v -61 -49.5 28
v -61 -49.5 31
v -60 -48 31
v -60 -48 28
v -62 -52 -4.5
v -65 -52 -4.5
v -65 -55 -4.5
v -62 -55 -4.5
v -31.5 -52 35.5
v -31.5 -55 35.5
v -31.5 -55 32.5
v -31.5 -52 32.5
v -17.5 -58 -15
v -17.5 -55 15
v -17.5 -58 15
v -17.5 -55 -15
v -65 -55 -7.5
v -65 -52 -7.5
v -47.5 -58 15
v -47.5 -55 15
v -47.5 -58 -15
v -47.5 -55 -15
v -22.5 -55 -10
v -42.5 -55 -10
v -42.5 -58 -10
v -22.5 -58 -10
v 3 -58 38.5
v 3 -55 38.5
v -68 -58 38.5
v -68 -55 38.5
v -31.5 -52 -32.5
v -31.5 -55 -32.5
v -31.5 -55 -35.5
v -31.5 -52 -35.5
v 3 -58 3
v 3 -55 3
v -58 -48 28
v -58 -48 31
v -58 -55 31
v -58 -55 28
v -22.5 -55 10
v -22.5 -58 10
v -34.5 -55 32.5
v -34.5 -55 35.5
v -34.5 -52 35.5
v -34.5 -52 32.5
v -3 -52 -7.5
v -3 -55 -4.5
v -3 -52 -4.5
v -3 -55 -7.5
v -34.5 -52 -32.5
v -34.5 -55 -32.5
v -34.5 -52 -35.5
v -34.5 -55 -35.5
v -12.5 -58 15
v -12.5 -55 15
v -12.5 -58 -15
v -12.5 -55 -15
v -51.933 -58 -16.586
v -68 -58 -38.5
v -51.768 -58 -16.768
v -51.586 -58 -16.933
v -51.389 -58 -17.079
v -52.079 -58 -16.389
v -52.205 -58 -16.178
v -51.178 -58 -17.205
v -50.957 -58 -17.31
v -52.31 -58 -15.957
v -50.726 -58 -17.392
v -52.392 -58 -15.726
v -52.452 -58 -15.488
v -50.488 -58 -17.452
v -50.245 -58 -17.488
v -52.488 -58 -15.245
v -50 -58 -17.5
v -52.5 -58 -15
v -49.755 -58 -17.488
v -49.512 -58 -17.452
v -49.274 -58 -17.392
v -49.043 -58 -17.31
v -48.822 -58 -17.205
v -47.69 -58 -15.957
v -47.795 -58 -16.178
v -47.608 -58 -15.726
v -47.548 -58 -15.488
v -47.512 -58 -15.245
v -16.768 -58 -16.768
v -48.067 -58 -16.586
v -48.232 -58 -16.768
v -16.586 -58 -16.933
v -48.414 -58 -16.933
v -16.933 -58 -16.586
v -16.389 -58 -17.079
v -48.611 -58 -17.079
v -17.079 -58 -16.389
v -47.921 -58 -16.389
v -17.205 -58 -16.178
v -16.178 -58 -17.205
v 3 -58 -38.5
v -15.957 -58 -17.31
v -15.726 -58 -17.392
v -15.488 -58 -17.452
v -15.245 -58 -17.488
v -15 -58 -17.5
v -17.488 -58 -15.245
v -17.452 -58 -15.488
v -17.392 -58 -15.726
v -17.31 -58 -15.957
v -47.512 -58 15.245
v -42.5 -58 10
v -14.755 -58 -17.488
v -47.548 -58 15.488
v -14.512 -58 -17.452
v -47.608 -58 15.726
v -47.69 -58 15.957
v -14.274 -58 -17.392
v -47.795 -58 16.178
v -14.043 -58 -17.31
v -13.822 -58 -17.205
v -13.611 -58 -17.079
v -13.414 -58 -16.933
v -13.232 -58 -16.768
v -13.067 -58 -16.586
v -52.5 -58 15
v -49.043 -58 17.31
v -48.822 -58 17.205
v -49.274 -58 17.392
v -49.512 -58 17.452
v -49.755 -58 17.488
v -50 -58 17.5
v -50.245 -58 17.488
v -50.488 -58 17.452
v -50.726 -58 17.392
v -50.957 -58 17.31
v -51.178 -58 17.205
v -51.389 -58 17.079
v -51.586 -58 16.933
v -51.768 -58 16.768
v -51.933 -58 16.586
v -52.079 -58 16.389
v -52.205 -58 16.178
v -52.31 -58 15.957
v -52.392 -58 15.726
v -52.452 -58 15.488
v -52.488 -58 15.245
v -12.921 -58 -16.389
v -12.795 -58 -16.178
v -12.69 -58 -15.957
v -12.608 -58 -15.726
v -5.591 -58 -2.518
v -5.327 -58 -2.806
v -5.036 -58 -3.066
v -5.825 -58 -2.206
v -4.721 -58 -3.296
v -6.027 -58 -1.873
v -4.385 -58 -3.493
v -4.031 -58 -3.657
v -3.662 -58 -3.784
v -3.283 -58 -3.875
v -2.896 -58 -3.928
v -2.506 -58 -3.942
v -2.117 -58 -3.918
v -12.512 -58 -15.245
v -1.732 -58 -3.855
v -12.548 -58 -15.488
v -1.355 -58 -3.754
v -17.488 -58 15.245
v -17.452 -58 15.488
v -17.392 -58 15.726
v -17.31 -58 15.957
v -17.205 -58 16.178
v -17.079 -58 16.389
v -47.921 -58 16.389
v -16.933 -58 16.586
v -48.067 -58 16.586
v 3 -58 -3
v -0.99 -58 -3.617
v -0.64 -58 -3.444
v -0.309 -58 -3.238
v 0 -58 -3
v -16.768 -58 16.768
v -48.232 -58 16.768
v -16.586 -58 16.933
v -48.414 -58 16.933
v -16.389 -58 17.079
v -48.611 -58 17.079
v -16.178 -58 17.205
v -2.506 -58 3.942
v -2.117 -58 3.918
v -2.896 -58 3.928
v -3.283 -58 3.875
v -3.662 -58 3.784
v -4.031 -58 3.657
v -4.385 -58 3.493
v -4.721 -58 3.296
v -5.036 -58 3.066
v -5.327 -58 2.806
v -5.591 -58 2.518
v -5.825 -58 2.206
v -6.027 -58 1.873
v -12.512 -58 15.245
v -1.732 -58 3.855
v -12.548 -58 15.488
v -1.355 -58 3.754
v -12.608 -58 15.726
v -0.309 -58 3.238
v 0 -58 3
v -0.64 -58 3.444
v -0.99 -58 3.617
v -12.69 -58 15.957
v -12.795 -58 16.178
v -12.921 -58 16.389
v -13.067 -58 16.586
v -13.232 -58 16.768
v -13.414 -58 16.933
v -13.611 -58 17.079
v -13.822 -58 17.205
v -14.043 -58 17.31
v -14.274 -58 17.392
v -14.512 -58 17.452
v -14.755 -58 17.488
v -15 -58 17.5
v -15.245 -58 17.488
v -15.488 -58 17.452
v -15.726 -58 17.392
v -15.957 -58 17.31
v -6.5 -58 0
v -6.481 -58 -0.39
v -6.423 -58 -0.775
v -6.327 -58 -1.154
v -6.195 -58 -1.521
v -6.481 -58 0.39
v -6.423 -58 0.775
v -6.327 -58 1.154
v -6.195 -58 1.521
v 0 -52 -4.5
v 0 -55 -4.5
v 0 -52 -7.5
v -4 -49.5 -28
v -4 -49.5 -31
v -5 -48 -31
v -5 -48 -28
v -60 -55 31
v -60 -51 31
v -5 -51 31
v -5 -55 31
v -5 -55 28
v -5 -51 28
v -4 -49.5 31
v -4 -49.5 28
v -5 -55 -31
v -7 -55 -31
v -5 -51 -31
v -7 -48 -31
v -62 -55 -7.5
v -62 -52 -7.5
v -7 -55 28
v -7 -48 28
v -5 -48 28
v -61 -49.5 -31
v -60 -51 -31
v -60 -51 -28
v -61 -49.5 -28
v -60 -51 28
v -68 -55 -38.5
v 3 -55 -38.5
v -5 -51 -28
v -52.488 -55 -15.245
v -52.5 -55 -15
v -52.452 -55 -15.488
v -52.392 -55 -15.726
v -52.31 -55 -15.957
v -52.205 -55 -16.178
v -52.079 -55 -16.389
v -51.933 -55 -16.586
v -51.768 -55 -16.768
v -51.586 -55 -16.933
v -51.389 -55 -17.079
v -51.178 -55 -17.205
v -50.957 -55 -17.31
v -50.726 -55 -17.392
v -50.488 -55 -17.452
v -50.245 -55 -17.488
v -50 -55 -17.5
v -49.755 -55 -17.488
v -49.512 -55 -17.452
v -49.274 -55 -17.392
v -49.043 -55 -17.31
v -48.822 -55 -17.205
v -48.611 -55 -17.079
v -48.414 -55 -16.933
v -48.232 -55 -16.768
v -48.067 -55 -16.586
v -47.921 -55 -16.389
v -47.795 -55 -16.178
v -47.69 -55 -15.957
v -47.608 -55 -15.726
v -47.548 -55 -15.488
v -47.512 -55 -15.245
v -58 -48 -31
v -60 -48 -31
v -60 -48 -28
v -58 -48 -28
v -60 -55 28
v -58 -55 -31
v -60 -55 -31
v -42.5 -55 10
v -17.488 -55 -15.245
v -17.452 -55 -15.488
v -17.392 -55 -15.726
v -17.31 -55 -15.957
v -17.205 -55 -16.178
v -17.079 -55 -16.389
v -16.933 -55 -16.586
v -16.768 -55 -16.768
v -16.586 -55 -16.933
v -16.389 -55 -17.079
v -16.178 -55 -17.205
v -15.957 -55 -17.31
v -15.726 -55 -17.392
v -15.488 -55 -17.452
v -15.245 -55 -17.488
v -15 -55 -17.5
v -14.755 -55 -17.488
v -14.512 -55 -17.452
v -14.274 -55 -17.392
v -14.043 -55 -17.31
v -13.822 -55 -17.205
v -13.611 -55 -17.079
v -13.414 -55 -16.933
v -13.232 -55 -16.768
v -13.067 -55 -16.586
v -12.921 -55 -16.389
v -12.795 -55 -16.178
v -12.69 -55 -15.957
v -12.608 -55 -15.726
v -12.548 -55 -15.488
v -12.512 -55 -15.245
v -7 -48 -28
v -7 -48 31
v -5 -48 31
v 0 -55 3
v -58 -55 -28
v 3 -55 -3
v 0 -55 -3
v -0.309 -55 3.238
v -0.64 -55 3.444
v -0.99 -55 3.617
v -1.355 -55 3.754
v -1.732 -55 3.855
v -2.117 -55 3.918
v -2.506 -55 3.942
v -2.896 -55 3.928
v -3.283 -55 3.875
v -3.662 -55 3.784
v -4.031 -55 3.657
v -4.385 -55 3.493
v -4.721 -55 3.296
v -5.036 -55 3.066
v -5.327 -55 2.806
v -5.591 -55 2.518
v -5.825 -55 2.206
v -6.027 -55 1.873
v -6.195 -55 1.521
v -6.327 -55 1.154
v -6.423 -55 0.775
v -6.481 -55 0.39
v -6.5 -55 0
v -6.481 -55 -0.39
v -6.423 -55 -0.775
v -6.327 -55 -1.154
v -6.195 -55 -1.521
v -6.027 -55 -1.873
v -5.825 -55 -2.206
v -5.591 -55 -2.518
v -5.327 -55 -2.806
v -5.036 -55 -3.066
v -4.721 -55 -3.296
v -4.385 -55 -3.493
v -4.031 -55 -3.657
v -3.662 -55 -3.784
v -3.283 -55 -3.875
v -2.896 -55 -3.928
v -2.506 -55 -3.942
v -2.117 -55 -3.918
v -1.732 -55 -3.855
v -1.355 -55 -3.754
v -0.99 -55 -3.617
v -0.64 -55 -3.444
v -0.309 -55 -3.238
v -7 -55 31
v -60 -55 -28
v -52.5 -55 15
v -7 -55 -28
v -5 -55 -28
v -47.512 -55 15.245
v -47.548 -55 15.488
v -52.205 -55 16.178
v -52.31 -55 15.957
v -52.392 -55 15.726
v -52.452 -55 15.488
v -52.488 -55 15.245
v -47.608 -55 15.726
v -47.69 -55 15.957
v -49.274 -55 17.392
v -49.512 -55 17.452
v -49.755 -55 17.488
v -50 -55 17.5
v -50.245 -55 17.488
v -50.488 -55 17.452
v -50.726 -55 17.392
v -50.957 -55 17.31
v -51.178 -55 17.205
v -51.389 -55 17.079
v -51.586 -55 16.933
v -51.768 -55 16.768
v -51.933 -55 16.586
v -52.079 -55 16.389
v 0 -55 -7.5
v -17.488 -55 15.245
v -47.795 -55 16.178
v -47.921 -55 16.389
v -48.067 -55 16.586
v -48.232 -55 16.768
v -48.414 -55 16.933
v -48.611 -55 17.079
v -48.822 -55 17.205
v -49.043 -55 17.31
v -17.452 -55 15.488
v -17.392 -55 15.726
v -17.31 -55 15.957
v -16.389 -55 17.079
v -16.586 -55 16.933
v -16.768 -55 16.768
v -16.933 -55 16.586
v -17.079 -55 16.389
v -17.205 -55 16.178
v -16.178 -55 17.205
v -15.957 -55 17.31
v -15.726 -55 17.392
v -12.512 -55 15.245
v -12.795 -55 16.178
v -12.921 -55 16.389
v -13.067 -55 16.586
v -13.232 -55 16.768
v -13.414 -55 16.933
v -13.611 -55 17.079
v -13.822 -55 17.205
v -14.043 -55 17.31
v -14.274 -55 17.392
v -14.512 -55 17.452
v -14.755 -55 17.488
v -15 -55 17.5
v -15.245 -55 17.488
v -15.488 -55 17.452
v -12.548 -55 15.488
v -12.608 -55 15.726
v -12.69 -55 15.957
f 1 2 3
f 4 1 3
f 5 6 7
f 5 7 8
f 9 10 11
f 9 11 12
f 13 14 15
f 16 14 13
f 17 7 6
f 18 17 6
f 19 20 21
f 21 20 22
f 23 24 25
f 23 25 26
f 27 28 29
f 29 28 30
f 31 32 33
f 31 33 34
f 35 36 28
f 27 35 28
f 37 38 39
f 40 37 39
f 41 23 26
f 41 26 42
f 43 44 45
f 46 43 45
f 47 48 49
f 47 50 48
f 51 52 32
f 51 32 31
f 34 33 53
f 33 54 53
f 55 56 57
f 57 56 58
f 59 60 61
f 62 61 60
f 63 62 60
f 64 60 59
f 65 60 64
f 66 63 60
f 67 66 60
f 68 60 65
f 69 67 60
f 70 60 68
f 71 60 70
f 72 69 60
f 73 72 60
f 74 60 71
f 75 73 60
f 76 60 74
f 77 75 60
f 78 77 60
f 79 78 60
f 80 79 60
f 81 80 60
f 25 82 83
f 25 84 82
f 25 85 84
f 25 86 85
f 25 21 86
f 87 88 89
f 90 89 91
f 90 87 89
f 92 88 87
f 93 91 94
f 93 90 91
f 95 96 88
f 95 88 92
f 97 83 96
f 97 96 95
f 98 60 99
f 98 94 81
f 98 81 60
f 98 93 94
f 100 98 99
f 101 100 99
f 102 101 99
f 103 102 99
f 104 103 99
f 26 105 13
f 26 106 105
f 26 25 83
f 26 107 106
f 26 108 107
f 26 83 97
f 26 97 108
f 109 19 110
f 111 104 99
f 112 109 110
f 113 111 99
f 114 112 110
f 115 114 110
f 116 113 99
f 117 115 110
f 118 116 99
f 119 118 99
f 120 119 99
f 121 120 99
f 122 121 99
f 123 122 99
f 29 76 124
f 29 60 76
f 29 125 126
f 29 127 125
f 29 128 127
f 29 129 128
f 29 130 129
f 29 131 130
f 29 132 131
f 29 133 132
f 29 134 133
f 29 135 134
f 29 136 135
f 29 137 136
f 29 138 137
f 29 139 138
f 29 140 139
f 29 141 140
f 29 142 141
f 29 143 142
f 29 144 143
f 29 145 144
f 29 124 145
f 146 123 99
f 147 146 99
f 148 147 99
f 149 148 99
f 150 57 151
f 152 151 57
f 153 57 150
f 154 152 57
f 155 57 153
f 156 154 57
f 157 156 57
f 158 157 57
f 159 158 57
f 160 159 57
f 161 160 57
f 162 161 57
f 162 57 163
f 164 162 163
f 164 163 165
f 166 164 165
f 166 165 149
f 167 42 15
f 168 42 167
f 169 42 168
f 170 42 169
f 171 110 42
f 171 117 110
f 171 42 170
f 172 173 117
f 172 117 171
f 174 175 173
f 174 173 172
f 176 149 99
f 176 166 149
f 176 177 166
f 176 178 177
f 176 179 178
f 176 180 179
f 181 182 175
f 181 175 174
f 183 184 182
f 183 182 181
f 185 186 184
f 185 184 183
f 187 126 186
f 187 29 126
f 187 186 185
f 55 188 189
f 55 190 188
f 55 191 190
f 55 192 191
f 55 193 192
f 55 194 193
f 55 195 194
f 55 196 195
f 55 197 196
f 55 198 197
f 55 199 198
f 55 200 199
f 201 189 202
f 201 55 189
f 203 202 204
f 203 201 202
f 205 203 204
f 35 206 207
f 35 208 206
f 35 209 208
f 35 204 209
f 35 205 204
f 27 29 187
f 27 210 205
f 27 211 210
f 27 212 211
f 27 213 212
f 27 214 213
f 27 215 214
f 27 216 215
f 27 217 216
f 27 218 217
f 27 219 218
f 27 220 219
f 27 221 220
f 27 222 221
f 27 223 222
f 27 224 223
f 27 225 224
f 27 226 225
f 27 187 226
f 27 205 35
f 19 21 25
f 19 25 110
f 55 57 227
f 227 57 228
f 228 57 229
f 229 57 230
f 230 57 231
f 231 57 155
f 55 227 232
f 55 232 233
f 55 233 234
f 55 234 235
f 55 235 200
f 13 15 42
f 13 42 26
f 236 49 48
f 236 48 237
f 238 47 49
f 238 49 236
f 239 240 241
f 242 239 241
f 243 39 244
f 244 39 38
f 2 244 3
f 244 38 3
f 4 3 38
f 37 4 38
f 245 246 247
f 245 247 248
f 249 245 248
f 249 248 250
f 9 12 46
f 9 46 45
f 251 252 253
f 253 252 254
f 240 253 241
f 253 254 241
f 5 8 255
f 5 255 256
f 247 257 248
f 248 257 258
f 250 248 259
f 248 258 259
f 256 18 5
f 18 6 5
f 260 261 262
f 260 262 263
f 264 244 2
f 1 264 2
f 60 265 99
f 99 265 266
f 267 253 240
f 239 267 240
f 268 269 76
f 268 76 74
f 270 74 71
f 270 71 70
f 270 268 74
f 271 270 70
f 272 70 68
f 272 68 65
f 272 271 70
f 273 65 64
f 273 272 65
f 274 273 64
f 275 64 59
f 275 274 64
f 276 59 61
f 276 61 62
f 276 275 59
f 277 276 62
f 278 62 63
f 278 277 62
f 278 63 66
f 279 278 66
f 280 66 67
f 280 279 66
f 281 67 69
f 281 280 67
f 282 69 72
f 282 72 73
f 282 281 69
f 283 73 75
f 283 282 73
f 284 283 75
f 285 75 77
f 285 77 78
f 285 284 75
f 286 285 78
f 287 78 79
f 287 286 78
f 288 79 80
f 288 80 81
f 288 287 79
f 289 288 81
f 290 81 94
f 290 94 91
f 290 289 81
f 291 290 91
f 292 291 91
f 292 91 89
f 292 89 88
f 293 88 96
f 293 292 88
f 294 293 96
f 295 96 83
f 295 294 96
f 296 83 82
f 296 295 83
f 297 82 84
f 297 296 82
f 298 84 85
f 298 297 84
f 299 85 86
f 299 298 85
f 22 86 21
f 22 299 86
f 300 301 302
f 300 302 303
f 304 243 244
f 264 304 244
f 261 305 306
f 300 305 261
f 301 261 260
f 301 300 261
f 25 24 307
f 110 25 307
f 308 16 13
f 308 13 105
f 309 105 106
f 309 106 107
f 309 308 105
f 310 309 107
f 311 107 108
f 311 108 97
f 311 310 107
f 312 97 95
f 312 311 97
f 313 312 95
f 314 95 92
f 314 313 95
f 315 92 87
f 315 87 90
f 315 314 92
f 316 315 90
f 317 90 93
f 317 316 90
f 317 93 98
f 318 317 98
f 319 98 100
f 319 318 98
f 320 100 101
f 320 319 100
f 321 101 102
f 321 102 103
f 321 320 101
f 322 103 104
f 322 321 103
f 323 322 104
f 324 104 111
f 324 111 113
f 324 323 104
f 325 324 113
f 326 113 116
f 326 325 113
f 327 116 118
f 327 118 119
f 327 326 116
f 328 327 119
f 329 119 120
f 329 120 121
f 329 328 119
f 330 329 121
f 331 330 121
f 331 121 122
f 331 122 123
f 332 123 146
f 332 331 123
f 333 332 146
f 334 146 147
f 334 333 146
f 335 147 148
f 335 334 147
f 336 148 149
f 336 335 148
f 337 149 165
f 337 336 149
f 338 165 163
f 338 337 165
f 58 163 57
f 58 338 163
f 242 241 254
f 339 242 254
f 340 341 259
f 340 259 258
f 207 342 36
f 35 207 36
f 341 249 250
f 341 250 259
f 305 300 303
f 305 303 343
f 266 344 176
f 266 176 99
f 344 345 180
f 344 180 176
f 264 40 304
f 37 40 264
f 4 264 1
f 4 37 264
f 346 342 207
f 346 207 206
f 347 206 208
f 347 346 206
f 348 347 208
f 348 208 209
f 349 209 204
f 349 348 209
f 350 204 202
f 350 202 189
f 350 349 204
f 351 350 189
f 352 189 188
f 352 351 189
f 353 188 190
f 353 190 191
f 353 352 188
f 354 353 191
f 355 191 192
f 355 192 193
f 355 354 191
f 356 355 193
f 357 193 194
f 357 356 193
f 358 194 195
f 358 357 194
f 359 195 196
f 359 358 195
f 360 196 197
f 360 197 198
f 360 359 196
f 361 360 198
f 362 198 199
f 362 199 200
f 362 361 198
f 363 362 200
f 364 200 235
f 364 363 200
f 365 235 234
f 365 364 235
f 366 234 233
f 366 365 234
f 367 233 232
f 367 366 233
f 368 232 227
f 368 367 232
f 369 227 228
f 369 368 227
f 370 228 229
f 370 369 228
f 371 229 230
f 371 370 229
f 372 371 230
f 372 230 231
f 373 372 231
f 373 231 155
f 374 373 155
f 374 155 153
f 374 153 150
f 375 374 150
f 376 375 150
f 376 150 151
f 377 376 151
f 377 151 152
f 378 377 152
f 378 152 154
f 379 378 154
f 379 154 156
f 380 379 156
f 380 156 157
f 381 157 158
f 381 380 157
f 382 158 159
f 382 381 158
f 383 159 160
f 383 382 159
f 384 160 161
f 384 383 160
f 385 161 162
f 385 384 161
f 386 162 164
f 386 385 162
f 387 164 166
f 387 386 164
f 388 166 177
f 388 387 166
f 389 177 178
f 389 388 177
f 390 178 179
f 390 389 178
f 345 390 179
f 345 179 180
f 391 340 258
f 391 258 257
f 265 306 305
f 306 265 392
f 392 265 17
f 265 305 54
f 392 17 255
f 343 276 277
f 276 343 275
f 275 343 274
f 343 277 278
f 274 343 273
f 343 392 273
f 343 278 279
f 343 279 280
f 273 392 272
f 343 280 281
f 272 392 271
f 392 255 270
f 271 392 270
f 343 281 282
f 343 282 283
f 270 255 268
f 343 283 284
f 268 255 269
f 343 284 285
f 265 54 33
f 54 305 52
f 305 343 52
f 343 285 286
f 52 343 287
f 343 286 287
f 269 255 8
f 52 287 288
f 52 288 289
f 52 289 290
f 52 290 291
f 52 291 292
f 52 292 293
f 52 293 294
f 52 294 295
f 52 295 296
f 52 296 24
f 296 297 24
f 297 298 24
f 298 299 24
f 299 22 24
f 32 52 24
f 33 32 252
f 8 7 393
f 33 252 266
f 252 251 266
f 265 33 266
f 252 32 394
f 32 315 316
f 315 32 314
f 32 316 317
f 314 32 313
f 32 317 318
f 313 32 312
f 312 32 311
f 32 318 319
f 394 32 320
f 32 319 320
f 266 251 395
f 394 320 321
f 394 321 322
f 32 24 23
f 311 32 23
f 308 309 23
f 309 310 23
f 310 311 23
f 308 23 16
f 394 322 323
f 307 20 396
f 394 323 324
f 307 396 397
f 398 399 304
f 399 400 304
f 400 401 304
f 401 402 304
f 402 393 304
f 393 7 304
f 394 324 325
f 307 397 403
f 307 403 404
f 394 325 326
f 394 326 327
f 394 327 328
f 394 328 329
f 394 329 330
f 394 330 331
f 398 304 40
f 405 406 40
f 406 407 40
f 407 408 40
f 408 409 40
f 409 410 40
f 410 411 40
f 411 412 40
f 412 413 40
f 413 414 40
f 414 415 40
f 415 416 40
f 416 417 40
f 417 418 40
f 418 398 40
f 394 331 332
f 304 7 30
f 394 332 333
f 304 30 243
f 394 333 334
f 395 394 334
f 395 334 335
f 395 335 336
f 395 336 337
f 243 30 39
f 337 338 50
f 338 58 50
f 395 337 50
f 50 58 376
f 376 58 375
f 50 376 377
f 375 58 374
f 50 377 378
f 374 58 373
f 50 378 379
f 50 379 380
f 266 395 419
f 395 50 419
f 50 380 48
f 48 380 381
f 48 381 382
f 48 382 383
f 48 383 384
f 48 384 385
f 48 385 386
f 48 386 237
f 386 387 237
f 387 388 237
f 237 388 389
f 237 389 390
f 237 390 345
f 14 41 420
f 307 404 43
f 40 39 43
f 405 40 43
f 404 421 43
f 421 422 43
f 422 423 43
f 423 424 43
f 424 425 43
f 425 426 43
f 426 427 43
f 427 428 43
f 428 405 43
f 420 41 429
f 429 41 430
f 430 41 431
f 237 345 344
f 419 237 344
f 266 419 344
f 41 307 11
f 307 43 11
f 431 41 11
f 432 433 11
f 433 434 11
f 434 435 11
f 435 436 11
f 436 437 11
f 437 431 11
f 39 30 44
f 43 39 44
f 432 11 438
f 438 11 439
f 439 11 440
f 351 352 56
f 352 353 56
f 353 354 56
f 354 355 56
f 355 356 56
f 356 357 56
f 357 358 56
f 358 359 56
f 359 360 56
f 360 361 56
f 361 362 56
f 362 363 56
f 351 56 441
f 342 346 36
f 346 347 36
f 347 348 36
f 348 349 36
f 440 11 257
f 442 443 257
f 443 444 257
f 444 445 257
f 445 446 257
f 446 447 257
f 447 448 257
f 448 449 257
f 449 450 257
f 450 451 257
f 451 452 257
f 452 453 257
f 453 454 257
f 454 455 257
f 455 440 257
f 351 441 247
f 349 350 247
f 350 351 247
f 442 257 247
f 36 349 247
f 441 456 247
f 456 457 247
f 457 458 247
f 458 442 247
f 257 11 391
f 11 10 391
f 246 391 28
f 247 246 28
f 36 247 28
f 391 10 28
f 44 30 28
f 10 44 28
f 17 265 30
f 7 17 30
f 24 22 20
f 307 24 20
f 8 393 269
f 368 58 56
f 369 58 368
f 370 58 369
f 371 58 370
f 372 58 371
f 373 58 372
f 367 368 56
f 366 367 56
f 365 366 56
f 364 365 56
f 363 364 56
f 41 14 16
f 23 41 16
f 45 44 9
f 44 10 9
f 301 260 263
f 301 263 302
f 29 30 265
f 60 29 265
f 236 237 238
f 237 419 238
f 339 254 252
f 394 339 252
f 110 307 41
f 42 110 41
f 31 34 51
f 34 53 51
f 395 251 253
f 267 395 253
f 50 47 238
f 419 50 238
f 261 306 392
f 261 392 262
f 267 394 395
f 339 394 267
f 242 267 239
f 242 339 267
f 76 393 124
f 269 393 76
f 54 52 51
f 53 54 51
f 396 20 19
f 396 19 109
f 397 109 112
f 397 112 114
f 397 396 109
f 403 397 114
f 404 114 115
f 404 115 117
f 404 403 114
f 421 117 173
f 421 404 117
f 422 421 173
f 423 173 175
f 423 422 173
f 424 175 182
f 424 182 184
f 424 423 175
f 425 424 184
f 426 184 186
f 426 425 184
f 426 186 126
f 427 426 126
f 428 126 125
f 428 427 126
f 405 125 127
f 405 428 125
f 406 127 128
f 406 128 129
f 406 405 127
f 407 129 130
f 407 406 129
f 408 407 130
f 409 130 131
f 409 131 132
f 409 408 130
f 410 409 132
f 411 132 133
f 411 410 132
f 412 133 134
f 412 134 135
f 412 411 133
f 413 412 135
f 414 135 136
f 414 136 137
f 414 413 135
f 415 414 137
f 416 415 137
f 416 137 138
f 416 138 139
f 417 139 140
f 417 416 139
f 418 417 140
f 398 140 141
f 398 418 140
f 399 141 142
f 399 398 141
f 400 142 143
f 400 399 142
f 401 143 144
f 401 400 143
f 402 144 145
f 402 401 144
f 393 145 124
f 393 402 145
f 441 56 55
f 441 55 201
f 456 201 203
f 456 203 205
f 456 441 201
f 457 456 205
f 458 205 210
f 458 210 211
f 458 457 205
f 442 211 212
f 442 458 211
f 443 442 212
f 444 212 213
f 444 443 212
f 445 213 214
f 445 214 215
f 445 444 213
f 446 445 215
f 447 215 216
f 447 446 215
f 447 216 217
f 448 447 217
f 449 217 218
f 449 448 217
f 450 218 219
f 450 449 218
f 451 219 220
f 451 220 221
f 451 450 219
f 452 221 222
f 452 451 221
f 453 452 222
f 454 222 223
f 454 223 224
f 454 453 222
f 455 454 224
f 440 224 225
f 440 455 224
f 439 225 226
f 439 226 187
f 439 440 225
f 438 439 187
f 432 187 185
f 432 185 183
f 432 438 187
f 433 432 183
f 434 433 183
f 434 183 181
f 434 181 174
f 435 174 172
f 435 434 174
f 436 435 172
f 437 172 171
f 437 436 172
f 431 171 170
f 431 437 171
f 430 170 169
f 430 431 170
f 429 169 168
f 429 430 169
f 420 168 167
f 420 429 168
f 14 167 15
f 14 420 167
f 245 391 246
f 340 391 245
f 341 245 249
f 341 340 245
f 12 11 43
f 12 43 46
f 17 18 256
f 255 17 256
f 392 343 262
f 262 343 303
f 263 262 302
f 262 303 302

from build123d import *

# Parameters (mm, degrees)
SKETCH008_W  = 20
SKETCH008_H  = 20
PAD004_DEPTH = 3
PAD005_DEPTH = 3
SKETCH014_W  = 3
SKETCH014_H  = 3
PAD010_DEPTH = 1.5
SKETCH015_W  = 3
SKETCH015_H  = 3
PAD011_DEPTH = 1.5


with BuildPart() as part:
    # Sketch008 → Pad004 (new body)
    with BuildSketch(Plane.XZ):
        with BuildLine():
            Line((-68, -38.5), (3, -38.5))
            Line((3, -3), (3, -38.5))
            Line((0, -3), (3, -3))
            ThreePointArc((0, 3), (-6.5, 0), (0, -3))
            Line((0, 3), (3, 3))
            Line((3, 3), (3, 38.5))
            Line((3, 38.5), (-68, 38.5))
            Line((-68, 38.5), (-68, -38.5))
        make_face()
        with BuildLine():
            ThreePointArc((-12.5, 15), (-15, 17.5), (-17.5, 15))
            Line((-17.5, 15), (-17.5, -15))
            ThreePointArc((-17.5, -15), (-15, -17.5), (-12.5, -15))
            Line((-12.5, 15), (-12.5, -15))
        make_face(mode=Mode.SUBTRACT)
        with BuildLine():
            ThreePointArc((-47.5, 15), (-50, 17.5), (-52.5, 15))
            Line((-52.5, 15), (-52.5, -15))
            ThreePointArc((-52.5, -15), (-50, -17.5), (-47.5, -15))
            Line((-47.5, 15), (-47.5, -15))
        make_face(mode=Mode.SUBTRACT)
        with Locations((-32.5, 0)):
            Rectangle(SKETCH008_W, SKETCH008_H, mode=Mode.SUBTRACT)
    extrude(amount=PAD004_DEPTH)

    # Sketch009 → Pad005 (join)
    with BuildSketch(Plane.XY.offset(31)):
        Polygon((-5, 0), (-5, 4), (-4, 5.5), (-5, 7), (-7, 7), (-7, 0), align=None)
        Polygon((-60, 0), (-60, 4), (-61, 5.5), (-60, 7), (-58, 7), (-58, 0), align=None)
    pad005 = extrude(amount=-PAD005_DEPTH)

    # Mirrored001: Pad005 across XY
    add(pad005.mirror(Plane.XY))

    # Sketch014 → Pad010 (join, symmetric)
    with BuildSketch(Plane.XY.offset(-6)):
        with Locations((-1.5, 1.5)):
            Rectangle(SKETCH014_W, SKETCH014_H)
        with Locations((-63.5, 1.5)):
            Rectangle(SKETCH014_W, SKETCH014_H)
    extrude(amount=PAD010_DEPTH, both=True)

    # Sketch015 → Pad011 (join, symmetric)
    with BuildSketch(Plane.YZ.offset(-33)):
        with Locations((1.5, -34)):
            Rectangle(SKETCH015_W, SKETCH015_H)
        with Locations((1.5, 34)):
            Rectangle(SKETCH015_W, SKETCH015_H)
    extrude(amount=PAD011_DEPTH, both=True)


with BuildPart() as part_1:
    # Body003 placement: moved
    add(part.part.moved(Location((0, -55, 0))))


solid = part_1.part
